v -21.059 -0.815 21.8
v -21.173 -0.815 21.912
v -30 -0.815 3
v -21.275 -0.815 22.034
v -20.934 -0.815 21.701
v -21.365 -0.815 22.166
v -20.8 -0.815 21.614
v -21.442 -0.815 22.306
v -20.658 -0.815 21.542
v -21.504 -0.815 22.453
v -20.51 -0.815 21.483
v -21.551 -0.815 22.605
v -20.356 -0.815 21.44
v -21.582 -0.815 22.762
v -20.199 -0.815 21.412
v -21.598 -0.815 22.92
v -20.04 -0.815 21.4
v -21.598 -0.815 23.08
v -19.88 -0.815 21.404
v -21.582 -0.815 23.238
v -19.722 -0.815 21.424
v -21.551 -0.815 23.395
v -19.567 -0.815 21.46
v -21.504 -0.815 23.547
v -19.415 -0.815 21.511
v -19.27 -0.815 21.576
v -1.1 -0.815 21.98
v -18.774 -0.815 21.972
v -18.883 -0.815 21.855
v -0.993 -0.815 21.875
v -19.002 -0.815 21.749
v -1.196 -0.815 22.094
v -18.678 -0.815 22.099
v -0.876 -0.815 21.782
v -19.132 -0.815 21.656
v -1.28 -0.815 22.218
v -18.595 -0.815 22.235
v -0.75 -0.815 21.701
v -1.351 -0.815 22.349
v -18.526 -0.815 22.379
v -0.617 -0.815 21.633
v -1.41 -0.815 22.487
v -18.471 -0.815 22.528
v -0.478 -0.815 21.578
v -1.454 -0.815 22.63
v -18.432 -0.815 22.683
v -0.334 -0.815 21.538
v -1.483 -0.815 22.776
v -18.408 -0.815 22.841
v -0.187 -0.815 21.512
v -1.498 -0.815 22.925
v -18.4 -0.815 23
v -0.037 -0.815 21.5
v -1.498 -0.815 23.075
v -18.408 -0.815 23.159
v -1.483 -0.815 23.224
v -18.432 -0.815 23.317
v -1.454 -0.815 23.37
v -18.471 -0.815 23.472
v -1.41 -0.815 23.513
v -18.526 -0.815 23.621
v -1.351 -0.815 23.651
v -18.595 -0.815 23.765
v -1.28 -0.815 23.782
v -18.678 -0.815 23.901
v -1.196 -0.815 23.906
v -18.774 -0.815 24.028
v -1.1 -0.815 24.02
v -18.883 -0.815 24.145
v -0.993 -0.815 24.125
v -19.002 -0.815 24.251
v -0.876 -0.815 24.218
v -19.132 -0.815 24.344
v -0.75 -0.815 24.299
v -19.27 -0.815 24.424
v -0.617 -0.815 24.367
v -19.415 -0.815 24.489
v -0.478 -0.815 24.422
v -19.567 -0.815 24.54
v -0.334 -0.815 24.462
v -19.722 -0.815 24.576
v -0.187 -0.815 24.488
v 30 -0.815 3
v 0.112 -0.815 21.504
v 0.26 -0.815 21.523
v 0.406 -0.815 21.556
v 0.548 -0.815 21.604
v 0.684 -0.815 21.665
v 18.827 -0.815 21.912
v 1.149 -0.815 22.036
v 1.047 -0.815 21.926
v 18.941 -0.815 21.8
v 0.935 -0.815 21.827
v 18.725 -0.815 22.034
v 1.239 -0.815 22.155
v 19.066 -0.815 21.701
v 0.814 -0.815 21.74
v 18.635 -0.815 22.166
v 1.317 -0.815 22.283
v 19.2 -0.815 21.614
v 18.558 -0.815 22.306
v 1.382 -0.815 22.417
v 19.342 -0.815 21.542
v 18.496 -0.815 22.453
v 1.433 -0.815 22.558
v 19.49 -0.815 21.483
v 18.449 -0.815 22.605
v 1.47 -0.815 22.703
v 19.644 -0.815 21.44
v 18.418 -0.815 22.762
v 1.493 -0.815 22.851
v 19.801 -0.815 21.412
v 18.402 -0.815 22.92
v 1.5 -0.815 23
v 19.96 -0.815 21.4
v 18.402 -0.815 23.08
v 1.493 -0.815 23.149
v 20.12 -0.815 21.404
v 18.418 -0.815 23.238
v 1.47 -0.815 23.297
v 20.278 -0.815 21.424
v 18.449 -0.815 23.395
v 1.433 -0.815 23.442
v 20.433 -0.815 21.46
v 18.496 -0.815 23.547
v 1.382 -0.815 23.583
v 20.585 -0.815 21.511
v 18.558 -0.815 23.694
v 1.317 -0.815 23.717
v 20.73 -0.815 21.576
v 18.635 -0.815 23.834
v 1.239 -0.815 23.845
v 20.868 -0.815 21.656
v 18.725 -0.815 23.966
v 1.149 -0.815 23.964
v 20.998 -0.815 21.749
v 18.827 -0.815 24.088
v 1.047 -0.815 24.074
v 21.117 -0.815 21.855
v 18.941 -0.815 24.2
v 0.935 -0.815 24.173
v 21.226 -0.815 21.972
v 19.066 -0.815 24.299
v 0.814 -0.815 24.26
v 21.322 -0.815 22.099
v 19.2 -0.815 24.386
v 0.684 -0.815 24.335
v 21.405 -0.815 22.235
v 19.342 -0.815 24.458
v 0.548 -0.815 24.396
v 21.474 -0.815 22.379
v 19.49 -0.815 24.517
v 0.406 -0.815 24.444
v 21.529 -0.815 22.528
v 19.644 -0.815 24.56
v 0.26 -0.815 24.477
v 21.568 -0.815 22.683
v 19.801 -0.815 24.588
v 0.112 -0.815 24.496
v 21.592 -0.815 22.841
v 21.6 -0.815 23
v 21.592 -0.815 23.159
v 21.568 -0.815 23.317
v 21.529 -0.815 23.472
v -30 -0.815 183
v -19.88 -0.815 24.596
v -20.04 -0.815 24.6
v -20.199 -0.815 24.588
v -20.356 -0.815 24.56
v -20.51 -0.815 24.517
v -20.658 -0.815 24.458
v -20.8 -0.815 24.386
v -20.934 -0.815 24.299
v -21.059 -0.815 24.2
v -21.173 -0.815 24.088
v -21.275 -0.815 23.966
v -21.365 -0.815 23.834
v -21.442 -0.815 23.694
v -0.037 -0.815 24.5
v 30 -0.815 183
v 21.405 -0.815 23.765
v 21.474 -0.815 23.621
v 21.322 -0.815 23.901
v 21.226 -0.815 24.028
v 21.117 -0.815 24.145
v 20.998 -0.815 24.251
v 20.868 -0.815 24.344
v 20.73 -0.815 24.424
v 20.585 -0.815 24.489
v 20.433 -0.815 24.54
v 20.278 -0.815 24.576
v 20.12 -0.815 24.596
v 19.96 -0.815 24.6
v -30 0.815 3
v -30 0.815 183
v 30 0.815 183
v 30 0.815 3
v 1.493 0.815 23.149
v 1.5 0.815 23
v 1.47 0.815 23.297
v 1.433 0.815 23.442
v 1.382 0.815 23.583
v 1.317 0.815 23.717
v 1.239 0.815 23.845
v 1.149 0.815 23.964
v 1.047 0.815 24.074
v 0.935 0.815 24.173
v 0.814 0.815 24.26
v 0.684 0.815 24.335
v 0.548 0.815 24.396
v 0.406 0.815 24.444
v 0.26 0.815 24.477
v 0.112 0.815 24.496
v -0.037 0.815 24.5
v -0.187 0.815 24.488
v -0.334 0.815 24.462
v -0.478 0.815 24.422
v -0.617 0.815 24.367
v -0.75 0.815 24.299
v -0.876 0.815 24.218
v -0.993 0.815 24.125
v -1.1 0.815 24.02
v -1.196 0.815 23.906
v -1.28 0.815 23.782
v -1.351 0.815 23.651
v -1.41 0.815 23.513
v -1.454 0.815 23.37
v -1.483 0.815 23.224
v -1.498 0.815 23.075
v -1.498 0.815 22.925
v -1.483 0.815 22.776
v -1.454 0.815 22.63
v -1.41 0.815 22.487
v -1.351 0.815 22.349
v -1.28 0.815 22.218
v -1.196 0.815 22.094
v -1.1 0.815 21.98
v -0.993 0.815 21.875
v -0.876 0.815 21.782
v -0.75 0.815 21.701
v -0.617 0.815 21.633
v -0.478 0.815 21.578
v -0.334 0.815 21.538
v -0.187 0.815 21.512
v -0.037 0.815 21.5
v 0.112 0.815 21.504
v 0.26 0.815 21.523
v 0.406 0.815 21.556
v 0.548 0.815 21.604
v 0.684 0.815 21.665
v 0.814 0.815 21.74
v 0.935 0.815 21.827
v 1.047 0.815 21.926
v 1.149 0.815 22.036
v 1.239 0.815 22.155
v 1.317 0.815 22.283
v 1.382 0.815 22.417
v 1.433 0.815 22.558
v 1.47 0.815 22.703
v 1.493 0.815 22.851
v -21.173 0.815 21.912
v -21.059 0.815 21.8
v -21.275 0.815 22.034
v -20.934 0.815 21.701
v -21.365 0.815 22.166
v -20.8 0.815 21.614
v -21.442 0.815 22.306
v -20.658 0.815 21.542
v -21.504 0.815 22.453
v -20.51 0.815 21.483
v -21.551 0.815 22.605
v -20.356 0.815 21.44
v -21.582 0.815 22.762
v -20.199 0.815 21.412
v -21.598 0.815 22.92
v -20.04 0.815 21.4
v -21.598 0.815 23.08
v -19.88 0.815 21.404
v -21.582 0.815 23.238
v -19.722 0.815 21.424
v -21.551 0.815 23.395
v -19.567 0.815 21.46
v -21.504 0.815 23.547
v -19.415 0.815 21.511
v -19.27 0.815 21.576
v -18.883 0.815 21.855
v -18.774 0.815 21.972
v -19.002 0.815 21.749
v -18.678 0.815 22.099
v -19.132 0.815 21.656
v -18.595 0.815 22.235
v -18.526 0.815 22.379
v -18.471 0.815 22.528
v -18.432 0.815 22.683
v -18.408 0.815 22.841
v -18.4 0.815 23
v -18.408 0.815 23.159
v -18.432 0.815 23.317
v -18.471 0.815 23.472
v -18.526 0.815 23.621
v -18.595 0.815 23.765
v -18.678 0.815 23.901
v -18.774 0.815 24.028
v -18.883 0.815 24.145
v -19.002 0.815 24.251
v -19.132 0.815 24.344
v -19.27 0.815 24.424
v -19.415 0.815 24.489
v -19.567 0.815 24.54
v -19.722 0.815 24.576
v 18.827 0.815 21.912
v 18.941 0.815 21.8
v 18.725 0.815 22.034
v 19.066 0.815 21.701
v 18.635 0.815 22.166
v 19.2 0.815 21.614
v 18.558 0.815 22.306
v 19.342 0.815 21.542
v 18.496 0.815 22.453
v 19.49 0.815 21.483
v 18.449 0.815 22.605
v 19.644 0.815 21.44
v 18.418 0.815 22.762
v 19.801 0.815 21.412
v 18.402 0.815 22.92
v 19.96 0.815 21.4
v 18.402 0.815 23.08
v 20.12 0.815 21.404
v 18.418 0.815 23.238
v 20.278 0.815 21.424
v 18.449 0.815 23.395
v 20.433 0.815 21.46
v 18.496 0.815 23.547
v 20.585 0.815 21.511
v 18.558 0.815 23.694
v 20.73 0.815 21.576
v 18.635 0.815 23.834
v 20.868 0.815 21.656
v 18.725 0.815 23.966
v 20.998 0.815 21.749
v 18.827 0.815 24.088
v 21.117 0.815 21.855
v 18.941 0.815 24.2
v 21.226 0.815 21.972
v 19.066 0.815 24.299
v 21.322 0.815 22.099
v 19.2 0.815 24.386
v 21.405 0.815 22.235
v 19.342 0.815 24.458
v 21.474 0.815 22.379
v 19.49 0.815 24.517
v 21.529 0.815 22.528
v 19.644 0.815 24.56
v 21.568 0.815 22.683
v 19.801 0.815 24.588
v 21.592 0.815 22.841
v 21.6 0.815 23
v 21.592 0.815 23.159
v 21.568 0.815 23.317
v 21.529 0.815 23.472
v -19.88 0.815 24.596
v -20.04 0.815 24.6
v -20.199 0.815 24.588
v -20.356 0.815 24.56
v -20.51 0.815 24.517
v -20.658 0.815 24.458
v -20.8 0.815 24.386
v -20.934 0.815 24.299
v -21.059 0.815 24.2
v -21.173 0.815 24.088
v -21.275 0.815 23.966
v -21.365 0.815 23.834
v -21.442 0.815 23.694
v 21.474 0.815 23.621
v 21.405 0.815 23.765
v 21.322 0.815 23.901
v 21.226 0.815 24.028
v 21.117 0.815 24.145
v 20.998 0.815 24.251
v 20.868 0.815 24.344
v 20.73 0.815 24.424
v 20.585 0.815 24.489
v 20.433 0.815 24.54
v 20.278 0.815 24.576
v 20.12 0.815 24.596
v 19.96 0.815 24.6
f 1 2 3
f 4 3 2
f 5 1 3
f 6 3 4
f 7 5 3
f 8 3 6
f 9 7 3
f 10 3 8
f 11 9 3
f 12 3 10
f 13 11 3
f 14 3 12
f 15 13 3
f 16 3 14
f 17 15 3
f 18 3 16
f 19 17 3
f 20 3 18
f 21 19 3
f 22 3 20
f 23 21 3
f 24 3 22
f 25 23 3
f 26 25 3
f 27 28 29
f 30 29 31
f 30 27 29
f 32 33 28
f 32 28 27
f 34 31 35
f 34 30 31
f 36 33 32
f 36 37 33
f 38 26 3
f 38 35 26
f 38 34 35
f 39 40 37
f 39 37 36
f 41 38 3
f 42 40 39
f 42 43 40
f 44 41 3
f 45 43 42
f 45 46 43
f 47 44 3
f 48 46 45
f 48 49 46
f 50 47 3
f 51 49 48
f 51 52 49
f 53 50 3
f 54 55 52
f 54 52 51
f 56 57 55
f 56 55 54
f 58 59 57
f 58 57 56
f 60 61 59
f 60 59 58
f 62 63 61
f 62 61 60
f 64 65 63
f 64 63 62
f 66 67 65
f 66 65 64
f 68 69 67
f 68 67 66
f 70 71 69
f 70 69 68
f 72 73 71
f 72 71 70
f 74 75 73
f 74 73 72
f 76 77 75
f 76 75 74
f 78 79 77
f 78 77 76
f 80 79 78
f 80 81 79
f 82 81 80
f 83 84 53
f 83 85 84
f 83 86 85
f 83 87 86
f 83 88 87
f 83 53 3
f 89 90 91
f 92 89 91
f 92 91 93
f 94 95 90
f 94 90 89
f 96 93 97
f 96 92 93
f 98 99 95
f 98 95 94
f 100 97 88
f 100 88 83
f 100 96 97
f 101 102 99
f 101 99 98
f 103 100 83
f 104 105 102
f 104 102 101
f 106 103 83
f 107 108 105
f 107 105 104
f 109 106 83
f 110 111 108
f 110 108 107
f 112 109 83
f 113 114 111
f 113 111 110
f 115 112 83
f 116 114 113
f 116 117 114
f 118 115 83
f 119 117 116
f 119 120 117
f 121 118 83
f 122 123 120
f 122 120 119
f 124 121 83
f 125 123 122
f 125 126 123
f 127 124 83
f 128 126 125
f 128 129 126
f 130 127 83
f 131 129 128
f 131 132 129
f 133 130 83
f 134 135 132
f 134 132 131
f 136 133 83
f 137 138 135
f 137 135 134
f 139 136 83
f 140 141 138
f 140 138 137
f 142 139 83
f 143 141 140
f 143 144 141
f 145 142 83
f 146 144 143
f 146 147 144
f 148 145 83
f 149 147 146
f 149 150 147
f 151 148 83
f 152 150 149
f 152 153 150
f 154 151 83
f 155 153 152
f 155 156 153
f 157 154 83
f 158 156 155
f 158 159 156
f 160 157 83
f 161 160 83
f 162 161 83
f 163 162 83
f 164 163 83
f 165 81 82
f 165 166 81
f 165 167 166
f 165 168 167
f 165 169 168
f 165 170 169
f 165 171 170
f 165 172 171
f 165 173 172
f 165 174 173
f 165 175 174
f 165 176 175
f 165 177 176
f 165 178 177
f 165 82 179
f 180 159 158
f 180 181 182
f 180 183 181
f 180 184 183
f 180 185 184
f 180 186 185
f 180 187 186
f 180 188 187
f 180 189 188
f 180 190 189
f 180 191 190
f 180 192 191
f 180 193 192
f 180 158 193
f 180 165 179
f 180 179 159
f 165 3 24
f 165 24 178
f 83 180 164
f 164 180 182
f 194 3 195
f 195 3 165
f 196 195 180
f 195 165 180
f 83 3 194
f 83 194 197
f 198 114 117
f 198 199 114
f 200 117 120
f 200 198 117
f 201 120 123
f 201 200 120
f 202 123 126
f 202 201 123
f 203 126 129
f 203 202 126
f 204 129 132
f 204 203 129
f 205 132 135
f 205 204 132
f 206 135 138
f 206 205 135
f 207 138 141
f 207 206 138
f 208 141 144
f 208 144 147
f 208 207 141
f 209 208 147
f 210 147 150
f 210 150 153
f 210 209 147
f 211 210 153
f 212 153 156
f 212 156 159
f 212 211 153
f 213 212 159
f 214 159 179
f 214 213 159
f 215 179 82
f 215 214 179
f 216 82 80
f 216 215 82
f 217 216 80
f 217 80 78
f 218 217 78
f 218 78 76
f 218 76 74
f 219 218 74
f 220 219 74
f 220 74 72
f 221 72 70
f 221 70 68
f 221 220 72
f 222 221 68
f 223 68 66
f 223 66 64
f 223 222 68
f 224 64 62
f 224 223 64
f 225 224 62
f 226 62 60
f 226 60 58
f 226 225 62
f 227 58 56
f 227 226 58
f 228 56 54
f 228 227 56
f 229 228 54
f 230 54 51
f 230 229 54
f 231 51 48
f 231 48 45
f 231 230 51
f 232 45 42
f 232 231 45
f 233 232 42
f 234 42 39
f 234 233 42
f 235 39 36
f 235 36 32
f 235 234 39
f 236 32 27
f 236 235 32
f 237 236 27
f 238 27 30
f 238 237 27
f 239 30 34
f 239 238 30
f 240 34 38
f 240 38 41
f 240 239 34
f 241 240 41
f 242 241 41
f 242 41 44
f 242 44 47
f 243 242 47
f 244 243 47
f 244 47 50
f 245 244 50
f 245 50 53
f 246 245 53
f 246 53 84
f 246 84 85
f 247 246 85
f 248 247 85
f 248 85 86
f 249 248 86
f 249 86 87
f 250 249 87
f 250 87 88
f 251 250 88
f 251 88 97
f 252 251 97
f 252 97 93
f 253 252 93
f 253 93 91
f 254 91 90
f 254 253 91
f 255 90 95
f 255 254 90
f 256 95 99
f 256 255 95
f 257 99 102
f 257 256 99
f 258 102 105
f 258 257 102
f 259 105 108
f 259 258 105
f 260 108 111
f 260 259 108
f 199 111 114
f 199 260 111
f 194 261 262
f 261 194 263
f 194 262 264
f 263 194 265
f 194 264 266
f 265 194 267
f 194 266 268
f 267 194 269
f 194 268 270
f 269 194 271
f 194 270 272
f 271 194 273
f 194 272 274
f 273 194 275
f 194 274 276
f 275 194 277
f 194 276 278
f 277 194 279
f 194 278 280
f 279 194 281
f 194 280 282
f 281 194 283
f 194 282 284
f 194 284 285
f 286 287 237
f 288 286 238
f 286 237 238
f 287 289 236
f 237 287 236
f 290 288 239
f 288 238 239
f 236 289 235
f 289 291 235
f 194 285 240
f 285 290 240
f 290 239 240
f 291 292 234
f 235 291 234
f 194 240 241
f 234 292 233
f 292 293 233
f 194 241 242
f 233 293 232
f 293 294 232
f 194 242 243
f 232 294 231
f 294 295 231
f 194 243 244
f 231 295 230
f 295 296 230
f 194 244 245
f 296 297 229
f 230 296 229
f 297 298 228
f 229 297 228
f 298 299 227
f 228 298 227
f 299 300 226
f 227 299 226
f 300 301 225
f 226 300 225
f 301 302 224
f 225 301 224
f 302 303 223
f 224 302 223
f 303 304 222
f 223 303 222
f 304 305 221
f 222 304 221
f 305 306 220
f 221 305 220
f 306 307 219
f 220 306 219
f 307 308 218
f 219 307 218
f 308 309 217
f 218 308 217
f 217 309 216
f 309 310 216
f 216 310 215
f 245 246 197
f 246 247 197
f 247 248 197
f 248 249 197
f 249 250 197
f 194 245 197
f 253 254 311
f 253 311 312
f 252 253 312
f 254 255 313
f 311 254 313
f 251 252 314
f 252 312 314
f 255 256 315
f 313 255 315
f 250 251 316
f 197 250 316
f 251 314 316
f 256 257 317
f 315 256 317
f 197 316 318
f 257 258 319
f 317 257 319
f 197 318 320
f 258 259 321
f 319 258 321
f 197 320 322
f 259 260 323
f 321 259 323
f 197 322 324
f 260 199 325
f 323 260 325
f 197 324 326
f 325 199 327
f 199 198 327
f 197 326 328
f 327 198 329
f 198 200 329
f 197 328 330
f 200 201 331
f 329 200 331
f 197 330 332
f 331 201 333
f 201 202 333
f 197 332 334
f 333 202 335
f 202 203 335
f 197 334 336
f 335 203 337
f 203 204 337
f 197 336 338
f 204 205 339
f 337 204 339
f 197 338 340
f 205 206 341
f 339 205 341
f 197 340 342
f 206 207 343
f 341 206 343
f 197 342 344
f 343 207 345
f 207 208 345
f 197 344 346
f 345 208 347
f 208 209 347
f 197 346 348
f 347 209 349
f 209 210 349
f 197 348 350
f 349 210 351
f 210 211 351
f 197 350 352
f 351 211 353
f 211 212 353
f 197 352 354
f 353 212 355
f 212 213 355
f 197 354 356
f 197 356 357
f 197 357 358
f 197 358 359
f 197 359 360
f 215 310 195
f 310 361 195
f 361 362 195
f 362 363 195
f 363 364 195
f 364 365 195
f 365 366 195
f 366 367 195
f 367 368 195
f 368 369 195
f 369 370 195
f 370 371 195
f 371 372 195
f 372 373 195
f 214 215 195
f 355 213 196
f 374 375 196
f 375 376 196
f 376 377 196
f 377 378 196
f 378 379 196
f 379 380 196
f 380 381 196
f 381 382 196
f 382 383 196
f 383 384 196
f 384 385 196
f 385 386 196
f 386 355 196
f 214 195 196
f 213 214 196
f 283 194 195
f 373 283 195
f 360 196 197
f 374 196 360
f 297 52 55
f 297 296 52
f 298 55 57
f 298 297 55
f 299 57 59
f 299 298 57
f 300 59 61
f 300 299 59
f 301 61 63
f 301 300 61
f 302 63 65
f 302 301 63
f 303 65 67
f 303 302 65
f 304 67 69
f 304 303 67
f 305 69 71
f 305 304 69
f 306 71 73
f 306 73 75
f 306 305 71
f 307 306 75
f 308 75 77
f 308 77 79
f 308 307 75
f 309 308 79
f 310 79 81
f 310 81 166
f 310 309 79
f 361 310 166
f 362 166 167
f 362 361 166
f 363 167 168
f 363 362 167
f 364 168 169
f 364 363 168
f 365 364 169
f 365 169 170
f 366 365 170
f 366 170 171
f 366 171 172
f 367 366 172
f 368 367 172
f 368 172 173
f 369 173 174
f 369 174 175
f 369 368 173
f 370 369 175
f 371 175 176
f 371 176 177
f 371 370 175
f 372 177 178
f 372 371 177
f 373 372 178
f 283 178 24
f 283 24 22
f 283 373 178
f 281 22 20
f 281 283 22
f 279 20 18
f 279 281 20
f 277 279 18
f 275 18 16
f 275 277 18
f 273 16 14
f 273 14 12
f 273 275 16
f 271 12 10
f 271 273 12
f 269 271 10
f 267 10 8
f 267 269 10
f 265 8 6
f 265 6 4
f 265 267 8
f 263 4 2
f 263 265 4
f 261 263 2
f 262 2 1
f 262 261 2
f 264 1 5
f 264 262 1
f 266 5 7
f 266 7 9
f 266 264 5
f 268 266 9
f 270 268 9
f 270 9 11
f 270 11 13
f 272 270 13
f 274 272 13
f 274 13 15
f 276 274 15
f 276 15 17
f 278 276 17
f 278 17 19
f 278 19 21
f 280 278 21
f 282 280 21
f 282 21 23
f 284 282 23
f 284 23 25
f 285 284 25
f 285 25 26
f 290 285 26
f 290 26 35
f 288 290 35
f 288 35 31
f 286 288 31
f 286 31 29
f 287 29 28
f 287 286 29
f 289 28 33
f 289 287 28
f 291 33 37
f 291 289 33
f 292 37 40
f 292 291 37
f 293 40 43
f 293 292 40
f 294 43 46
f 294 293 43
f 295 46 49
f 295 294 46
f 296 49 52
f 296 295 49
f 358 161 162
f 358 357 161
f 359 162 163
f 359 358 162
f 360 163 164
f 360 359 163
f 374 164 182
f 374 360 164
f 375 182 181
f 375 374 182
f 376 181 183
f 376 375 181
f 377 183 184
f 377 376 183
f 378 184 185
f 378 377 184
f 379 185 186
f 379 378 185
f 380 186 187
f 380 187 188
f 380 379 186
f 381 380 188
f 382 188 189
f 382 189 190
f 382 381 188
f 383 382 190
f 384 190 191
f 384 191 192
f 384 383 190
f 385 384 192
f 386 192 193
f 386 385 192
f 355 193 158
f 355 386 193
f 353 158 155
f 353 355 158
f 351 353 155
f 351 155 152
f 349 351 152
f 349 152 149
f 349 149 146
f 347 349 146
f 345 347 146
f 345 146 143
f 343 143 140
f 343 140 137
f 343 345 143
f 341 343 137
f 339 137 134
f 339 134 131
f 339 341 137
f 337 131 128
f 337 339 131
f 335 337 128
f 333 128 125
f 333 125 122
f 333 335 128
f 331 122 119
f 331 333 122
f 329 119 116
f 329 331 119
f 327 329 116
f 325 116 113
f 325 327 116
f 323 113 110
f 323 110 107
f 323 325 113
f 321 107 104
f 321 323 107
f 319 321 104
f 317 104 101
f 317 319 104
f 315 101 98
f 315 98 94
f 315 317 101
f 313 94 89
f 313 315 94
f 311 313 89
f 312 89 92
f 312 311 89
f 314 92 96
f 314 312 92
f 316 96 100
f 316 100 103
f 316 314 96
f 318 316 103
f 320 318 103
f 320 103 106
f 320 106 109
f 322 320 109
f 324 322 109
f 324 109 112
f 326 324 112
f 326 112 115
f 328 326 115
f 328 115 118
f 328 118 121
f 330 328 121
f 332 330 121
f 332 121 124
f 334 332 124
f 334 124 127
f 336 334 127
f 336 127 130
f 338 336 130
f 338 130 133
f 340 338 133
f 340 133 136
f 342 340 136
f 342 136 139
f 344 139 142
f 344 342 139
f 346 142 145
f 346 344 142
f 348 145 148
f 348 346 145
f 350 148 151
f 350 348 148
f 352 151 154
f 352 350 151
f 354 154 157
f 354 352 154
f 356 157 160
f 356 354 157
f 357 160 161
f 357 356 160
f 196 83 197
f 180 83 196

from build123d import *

# Parameters (mm, degrees)
F0_W     = 60
F0_H     = 180
F0_R     = 1.6
F0_R_2   = 1.5
F1_DEPTH = 0.815


with BuildPart() as f1:
    # F0 (on Front) → F1 (new body, symmetric)
    with BuildSketch(Plane.XZ):
        with Locations((0, 93)):
            Rectangle(F0_W, F0_H)
        with Locations((-20, 23)):
            Circle(F0_R, mode=Mode.SUBTRACT)
        with Locations((0, 23)):
            Circle(F0_R_2, mode=Mode.SUBTRACT)
        with Locations((20, 23)):
            Circle(F0_R, mode=Mode.SUBTRACT)
    extrude(amount=F1_DEPTH, both=True)


solid = f1.part
